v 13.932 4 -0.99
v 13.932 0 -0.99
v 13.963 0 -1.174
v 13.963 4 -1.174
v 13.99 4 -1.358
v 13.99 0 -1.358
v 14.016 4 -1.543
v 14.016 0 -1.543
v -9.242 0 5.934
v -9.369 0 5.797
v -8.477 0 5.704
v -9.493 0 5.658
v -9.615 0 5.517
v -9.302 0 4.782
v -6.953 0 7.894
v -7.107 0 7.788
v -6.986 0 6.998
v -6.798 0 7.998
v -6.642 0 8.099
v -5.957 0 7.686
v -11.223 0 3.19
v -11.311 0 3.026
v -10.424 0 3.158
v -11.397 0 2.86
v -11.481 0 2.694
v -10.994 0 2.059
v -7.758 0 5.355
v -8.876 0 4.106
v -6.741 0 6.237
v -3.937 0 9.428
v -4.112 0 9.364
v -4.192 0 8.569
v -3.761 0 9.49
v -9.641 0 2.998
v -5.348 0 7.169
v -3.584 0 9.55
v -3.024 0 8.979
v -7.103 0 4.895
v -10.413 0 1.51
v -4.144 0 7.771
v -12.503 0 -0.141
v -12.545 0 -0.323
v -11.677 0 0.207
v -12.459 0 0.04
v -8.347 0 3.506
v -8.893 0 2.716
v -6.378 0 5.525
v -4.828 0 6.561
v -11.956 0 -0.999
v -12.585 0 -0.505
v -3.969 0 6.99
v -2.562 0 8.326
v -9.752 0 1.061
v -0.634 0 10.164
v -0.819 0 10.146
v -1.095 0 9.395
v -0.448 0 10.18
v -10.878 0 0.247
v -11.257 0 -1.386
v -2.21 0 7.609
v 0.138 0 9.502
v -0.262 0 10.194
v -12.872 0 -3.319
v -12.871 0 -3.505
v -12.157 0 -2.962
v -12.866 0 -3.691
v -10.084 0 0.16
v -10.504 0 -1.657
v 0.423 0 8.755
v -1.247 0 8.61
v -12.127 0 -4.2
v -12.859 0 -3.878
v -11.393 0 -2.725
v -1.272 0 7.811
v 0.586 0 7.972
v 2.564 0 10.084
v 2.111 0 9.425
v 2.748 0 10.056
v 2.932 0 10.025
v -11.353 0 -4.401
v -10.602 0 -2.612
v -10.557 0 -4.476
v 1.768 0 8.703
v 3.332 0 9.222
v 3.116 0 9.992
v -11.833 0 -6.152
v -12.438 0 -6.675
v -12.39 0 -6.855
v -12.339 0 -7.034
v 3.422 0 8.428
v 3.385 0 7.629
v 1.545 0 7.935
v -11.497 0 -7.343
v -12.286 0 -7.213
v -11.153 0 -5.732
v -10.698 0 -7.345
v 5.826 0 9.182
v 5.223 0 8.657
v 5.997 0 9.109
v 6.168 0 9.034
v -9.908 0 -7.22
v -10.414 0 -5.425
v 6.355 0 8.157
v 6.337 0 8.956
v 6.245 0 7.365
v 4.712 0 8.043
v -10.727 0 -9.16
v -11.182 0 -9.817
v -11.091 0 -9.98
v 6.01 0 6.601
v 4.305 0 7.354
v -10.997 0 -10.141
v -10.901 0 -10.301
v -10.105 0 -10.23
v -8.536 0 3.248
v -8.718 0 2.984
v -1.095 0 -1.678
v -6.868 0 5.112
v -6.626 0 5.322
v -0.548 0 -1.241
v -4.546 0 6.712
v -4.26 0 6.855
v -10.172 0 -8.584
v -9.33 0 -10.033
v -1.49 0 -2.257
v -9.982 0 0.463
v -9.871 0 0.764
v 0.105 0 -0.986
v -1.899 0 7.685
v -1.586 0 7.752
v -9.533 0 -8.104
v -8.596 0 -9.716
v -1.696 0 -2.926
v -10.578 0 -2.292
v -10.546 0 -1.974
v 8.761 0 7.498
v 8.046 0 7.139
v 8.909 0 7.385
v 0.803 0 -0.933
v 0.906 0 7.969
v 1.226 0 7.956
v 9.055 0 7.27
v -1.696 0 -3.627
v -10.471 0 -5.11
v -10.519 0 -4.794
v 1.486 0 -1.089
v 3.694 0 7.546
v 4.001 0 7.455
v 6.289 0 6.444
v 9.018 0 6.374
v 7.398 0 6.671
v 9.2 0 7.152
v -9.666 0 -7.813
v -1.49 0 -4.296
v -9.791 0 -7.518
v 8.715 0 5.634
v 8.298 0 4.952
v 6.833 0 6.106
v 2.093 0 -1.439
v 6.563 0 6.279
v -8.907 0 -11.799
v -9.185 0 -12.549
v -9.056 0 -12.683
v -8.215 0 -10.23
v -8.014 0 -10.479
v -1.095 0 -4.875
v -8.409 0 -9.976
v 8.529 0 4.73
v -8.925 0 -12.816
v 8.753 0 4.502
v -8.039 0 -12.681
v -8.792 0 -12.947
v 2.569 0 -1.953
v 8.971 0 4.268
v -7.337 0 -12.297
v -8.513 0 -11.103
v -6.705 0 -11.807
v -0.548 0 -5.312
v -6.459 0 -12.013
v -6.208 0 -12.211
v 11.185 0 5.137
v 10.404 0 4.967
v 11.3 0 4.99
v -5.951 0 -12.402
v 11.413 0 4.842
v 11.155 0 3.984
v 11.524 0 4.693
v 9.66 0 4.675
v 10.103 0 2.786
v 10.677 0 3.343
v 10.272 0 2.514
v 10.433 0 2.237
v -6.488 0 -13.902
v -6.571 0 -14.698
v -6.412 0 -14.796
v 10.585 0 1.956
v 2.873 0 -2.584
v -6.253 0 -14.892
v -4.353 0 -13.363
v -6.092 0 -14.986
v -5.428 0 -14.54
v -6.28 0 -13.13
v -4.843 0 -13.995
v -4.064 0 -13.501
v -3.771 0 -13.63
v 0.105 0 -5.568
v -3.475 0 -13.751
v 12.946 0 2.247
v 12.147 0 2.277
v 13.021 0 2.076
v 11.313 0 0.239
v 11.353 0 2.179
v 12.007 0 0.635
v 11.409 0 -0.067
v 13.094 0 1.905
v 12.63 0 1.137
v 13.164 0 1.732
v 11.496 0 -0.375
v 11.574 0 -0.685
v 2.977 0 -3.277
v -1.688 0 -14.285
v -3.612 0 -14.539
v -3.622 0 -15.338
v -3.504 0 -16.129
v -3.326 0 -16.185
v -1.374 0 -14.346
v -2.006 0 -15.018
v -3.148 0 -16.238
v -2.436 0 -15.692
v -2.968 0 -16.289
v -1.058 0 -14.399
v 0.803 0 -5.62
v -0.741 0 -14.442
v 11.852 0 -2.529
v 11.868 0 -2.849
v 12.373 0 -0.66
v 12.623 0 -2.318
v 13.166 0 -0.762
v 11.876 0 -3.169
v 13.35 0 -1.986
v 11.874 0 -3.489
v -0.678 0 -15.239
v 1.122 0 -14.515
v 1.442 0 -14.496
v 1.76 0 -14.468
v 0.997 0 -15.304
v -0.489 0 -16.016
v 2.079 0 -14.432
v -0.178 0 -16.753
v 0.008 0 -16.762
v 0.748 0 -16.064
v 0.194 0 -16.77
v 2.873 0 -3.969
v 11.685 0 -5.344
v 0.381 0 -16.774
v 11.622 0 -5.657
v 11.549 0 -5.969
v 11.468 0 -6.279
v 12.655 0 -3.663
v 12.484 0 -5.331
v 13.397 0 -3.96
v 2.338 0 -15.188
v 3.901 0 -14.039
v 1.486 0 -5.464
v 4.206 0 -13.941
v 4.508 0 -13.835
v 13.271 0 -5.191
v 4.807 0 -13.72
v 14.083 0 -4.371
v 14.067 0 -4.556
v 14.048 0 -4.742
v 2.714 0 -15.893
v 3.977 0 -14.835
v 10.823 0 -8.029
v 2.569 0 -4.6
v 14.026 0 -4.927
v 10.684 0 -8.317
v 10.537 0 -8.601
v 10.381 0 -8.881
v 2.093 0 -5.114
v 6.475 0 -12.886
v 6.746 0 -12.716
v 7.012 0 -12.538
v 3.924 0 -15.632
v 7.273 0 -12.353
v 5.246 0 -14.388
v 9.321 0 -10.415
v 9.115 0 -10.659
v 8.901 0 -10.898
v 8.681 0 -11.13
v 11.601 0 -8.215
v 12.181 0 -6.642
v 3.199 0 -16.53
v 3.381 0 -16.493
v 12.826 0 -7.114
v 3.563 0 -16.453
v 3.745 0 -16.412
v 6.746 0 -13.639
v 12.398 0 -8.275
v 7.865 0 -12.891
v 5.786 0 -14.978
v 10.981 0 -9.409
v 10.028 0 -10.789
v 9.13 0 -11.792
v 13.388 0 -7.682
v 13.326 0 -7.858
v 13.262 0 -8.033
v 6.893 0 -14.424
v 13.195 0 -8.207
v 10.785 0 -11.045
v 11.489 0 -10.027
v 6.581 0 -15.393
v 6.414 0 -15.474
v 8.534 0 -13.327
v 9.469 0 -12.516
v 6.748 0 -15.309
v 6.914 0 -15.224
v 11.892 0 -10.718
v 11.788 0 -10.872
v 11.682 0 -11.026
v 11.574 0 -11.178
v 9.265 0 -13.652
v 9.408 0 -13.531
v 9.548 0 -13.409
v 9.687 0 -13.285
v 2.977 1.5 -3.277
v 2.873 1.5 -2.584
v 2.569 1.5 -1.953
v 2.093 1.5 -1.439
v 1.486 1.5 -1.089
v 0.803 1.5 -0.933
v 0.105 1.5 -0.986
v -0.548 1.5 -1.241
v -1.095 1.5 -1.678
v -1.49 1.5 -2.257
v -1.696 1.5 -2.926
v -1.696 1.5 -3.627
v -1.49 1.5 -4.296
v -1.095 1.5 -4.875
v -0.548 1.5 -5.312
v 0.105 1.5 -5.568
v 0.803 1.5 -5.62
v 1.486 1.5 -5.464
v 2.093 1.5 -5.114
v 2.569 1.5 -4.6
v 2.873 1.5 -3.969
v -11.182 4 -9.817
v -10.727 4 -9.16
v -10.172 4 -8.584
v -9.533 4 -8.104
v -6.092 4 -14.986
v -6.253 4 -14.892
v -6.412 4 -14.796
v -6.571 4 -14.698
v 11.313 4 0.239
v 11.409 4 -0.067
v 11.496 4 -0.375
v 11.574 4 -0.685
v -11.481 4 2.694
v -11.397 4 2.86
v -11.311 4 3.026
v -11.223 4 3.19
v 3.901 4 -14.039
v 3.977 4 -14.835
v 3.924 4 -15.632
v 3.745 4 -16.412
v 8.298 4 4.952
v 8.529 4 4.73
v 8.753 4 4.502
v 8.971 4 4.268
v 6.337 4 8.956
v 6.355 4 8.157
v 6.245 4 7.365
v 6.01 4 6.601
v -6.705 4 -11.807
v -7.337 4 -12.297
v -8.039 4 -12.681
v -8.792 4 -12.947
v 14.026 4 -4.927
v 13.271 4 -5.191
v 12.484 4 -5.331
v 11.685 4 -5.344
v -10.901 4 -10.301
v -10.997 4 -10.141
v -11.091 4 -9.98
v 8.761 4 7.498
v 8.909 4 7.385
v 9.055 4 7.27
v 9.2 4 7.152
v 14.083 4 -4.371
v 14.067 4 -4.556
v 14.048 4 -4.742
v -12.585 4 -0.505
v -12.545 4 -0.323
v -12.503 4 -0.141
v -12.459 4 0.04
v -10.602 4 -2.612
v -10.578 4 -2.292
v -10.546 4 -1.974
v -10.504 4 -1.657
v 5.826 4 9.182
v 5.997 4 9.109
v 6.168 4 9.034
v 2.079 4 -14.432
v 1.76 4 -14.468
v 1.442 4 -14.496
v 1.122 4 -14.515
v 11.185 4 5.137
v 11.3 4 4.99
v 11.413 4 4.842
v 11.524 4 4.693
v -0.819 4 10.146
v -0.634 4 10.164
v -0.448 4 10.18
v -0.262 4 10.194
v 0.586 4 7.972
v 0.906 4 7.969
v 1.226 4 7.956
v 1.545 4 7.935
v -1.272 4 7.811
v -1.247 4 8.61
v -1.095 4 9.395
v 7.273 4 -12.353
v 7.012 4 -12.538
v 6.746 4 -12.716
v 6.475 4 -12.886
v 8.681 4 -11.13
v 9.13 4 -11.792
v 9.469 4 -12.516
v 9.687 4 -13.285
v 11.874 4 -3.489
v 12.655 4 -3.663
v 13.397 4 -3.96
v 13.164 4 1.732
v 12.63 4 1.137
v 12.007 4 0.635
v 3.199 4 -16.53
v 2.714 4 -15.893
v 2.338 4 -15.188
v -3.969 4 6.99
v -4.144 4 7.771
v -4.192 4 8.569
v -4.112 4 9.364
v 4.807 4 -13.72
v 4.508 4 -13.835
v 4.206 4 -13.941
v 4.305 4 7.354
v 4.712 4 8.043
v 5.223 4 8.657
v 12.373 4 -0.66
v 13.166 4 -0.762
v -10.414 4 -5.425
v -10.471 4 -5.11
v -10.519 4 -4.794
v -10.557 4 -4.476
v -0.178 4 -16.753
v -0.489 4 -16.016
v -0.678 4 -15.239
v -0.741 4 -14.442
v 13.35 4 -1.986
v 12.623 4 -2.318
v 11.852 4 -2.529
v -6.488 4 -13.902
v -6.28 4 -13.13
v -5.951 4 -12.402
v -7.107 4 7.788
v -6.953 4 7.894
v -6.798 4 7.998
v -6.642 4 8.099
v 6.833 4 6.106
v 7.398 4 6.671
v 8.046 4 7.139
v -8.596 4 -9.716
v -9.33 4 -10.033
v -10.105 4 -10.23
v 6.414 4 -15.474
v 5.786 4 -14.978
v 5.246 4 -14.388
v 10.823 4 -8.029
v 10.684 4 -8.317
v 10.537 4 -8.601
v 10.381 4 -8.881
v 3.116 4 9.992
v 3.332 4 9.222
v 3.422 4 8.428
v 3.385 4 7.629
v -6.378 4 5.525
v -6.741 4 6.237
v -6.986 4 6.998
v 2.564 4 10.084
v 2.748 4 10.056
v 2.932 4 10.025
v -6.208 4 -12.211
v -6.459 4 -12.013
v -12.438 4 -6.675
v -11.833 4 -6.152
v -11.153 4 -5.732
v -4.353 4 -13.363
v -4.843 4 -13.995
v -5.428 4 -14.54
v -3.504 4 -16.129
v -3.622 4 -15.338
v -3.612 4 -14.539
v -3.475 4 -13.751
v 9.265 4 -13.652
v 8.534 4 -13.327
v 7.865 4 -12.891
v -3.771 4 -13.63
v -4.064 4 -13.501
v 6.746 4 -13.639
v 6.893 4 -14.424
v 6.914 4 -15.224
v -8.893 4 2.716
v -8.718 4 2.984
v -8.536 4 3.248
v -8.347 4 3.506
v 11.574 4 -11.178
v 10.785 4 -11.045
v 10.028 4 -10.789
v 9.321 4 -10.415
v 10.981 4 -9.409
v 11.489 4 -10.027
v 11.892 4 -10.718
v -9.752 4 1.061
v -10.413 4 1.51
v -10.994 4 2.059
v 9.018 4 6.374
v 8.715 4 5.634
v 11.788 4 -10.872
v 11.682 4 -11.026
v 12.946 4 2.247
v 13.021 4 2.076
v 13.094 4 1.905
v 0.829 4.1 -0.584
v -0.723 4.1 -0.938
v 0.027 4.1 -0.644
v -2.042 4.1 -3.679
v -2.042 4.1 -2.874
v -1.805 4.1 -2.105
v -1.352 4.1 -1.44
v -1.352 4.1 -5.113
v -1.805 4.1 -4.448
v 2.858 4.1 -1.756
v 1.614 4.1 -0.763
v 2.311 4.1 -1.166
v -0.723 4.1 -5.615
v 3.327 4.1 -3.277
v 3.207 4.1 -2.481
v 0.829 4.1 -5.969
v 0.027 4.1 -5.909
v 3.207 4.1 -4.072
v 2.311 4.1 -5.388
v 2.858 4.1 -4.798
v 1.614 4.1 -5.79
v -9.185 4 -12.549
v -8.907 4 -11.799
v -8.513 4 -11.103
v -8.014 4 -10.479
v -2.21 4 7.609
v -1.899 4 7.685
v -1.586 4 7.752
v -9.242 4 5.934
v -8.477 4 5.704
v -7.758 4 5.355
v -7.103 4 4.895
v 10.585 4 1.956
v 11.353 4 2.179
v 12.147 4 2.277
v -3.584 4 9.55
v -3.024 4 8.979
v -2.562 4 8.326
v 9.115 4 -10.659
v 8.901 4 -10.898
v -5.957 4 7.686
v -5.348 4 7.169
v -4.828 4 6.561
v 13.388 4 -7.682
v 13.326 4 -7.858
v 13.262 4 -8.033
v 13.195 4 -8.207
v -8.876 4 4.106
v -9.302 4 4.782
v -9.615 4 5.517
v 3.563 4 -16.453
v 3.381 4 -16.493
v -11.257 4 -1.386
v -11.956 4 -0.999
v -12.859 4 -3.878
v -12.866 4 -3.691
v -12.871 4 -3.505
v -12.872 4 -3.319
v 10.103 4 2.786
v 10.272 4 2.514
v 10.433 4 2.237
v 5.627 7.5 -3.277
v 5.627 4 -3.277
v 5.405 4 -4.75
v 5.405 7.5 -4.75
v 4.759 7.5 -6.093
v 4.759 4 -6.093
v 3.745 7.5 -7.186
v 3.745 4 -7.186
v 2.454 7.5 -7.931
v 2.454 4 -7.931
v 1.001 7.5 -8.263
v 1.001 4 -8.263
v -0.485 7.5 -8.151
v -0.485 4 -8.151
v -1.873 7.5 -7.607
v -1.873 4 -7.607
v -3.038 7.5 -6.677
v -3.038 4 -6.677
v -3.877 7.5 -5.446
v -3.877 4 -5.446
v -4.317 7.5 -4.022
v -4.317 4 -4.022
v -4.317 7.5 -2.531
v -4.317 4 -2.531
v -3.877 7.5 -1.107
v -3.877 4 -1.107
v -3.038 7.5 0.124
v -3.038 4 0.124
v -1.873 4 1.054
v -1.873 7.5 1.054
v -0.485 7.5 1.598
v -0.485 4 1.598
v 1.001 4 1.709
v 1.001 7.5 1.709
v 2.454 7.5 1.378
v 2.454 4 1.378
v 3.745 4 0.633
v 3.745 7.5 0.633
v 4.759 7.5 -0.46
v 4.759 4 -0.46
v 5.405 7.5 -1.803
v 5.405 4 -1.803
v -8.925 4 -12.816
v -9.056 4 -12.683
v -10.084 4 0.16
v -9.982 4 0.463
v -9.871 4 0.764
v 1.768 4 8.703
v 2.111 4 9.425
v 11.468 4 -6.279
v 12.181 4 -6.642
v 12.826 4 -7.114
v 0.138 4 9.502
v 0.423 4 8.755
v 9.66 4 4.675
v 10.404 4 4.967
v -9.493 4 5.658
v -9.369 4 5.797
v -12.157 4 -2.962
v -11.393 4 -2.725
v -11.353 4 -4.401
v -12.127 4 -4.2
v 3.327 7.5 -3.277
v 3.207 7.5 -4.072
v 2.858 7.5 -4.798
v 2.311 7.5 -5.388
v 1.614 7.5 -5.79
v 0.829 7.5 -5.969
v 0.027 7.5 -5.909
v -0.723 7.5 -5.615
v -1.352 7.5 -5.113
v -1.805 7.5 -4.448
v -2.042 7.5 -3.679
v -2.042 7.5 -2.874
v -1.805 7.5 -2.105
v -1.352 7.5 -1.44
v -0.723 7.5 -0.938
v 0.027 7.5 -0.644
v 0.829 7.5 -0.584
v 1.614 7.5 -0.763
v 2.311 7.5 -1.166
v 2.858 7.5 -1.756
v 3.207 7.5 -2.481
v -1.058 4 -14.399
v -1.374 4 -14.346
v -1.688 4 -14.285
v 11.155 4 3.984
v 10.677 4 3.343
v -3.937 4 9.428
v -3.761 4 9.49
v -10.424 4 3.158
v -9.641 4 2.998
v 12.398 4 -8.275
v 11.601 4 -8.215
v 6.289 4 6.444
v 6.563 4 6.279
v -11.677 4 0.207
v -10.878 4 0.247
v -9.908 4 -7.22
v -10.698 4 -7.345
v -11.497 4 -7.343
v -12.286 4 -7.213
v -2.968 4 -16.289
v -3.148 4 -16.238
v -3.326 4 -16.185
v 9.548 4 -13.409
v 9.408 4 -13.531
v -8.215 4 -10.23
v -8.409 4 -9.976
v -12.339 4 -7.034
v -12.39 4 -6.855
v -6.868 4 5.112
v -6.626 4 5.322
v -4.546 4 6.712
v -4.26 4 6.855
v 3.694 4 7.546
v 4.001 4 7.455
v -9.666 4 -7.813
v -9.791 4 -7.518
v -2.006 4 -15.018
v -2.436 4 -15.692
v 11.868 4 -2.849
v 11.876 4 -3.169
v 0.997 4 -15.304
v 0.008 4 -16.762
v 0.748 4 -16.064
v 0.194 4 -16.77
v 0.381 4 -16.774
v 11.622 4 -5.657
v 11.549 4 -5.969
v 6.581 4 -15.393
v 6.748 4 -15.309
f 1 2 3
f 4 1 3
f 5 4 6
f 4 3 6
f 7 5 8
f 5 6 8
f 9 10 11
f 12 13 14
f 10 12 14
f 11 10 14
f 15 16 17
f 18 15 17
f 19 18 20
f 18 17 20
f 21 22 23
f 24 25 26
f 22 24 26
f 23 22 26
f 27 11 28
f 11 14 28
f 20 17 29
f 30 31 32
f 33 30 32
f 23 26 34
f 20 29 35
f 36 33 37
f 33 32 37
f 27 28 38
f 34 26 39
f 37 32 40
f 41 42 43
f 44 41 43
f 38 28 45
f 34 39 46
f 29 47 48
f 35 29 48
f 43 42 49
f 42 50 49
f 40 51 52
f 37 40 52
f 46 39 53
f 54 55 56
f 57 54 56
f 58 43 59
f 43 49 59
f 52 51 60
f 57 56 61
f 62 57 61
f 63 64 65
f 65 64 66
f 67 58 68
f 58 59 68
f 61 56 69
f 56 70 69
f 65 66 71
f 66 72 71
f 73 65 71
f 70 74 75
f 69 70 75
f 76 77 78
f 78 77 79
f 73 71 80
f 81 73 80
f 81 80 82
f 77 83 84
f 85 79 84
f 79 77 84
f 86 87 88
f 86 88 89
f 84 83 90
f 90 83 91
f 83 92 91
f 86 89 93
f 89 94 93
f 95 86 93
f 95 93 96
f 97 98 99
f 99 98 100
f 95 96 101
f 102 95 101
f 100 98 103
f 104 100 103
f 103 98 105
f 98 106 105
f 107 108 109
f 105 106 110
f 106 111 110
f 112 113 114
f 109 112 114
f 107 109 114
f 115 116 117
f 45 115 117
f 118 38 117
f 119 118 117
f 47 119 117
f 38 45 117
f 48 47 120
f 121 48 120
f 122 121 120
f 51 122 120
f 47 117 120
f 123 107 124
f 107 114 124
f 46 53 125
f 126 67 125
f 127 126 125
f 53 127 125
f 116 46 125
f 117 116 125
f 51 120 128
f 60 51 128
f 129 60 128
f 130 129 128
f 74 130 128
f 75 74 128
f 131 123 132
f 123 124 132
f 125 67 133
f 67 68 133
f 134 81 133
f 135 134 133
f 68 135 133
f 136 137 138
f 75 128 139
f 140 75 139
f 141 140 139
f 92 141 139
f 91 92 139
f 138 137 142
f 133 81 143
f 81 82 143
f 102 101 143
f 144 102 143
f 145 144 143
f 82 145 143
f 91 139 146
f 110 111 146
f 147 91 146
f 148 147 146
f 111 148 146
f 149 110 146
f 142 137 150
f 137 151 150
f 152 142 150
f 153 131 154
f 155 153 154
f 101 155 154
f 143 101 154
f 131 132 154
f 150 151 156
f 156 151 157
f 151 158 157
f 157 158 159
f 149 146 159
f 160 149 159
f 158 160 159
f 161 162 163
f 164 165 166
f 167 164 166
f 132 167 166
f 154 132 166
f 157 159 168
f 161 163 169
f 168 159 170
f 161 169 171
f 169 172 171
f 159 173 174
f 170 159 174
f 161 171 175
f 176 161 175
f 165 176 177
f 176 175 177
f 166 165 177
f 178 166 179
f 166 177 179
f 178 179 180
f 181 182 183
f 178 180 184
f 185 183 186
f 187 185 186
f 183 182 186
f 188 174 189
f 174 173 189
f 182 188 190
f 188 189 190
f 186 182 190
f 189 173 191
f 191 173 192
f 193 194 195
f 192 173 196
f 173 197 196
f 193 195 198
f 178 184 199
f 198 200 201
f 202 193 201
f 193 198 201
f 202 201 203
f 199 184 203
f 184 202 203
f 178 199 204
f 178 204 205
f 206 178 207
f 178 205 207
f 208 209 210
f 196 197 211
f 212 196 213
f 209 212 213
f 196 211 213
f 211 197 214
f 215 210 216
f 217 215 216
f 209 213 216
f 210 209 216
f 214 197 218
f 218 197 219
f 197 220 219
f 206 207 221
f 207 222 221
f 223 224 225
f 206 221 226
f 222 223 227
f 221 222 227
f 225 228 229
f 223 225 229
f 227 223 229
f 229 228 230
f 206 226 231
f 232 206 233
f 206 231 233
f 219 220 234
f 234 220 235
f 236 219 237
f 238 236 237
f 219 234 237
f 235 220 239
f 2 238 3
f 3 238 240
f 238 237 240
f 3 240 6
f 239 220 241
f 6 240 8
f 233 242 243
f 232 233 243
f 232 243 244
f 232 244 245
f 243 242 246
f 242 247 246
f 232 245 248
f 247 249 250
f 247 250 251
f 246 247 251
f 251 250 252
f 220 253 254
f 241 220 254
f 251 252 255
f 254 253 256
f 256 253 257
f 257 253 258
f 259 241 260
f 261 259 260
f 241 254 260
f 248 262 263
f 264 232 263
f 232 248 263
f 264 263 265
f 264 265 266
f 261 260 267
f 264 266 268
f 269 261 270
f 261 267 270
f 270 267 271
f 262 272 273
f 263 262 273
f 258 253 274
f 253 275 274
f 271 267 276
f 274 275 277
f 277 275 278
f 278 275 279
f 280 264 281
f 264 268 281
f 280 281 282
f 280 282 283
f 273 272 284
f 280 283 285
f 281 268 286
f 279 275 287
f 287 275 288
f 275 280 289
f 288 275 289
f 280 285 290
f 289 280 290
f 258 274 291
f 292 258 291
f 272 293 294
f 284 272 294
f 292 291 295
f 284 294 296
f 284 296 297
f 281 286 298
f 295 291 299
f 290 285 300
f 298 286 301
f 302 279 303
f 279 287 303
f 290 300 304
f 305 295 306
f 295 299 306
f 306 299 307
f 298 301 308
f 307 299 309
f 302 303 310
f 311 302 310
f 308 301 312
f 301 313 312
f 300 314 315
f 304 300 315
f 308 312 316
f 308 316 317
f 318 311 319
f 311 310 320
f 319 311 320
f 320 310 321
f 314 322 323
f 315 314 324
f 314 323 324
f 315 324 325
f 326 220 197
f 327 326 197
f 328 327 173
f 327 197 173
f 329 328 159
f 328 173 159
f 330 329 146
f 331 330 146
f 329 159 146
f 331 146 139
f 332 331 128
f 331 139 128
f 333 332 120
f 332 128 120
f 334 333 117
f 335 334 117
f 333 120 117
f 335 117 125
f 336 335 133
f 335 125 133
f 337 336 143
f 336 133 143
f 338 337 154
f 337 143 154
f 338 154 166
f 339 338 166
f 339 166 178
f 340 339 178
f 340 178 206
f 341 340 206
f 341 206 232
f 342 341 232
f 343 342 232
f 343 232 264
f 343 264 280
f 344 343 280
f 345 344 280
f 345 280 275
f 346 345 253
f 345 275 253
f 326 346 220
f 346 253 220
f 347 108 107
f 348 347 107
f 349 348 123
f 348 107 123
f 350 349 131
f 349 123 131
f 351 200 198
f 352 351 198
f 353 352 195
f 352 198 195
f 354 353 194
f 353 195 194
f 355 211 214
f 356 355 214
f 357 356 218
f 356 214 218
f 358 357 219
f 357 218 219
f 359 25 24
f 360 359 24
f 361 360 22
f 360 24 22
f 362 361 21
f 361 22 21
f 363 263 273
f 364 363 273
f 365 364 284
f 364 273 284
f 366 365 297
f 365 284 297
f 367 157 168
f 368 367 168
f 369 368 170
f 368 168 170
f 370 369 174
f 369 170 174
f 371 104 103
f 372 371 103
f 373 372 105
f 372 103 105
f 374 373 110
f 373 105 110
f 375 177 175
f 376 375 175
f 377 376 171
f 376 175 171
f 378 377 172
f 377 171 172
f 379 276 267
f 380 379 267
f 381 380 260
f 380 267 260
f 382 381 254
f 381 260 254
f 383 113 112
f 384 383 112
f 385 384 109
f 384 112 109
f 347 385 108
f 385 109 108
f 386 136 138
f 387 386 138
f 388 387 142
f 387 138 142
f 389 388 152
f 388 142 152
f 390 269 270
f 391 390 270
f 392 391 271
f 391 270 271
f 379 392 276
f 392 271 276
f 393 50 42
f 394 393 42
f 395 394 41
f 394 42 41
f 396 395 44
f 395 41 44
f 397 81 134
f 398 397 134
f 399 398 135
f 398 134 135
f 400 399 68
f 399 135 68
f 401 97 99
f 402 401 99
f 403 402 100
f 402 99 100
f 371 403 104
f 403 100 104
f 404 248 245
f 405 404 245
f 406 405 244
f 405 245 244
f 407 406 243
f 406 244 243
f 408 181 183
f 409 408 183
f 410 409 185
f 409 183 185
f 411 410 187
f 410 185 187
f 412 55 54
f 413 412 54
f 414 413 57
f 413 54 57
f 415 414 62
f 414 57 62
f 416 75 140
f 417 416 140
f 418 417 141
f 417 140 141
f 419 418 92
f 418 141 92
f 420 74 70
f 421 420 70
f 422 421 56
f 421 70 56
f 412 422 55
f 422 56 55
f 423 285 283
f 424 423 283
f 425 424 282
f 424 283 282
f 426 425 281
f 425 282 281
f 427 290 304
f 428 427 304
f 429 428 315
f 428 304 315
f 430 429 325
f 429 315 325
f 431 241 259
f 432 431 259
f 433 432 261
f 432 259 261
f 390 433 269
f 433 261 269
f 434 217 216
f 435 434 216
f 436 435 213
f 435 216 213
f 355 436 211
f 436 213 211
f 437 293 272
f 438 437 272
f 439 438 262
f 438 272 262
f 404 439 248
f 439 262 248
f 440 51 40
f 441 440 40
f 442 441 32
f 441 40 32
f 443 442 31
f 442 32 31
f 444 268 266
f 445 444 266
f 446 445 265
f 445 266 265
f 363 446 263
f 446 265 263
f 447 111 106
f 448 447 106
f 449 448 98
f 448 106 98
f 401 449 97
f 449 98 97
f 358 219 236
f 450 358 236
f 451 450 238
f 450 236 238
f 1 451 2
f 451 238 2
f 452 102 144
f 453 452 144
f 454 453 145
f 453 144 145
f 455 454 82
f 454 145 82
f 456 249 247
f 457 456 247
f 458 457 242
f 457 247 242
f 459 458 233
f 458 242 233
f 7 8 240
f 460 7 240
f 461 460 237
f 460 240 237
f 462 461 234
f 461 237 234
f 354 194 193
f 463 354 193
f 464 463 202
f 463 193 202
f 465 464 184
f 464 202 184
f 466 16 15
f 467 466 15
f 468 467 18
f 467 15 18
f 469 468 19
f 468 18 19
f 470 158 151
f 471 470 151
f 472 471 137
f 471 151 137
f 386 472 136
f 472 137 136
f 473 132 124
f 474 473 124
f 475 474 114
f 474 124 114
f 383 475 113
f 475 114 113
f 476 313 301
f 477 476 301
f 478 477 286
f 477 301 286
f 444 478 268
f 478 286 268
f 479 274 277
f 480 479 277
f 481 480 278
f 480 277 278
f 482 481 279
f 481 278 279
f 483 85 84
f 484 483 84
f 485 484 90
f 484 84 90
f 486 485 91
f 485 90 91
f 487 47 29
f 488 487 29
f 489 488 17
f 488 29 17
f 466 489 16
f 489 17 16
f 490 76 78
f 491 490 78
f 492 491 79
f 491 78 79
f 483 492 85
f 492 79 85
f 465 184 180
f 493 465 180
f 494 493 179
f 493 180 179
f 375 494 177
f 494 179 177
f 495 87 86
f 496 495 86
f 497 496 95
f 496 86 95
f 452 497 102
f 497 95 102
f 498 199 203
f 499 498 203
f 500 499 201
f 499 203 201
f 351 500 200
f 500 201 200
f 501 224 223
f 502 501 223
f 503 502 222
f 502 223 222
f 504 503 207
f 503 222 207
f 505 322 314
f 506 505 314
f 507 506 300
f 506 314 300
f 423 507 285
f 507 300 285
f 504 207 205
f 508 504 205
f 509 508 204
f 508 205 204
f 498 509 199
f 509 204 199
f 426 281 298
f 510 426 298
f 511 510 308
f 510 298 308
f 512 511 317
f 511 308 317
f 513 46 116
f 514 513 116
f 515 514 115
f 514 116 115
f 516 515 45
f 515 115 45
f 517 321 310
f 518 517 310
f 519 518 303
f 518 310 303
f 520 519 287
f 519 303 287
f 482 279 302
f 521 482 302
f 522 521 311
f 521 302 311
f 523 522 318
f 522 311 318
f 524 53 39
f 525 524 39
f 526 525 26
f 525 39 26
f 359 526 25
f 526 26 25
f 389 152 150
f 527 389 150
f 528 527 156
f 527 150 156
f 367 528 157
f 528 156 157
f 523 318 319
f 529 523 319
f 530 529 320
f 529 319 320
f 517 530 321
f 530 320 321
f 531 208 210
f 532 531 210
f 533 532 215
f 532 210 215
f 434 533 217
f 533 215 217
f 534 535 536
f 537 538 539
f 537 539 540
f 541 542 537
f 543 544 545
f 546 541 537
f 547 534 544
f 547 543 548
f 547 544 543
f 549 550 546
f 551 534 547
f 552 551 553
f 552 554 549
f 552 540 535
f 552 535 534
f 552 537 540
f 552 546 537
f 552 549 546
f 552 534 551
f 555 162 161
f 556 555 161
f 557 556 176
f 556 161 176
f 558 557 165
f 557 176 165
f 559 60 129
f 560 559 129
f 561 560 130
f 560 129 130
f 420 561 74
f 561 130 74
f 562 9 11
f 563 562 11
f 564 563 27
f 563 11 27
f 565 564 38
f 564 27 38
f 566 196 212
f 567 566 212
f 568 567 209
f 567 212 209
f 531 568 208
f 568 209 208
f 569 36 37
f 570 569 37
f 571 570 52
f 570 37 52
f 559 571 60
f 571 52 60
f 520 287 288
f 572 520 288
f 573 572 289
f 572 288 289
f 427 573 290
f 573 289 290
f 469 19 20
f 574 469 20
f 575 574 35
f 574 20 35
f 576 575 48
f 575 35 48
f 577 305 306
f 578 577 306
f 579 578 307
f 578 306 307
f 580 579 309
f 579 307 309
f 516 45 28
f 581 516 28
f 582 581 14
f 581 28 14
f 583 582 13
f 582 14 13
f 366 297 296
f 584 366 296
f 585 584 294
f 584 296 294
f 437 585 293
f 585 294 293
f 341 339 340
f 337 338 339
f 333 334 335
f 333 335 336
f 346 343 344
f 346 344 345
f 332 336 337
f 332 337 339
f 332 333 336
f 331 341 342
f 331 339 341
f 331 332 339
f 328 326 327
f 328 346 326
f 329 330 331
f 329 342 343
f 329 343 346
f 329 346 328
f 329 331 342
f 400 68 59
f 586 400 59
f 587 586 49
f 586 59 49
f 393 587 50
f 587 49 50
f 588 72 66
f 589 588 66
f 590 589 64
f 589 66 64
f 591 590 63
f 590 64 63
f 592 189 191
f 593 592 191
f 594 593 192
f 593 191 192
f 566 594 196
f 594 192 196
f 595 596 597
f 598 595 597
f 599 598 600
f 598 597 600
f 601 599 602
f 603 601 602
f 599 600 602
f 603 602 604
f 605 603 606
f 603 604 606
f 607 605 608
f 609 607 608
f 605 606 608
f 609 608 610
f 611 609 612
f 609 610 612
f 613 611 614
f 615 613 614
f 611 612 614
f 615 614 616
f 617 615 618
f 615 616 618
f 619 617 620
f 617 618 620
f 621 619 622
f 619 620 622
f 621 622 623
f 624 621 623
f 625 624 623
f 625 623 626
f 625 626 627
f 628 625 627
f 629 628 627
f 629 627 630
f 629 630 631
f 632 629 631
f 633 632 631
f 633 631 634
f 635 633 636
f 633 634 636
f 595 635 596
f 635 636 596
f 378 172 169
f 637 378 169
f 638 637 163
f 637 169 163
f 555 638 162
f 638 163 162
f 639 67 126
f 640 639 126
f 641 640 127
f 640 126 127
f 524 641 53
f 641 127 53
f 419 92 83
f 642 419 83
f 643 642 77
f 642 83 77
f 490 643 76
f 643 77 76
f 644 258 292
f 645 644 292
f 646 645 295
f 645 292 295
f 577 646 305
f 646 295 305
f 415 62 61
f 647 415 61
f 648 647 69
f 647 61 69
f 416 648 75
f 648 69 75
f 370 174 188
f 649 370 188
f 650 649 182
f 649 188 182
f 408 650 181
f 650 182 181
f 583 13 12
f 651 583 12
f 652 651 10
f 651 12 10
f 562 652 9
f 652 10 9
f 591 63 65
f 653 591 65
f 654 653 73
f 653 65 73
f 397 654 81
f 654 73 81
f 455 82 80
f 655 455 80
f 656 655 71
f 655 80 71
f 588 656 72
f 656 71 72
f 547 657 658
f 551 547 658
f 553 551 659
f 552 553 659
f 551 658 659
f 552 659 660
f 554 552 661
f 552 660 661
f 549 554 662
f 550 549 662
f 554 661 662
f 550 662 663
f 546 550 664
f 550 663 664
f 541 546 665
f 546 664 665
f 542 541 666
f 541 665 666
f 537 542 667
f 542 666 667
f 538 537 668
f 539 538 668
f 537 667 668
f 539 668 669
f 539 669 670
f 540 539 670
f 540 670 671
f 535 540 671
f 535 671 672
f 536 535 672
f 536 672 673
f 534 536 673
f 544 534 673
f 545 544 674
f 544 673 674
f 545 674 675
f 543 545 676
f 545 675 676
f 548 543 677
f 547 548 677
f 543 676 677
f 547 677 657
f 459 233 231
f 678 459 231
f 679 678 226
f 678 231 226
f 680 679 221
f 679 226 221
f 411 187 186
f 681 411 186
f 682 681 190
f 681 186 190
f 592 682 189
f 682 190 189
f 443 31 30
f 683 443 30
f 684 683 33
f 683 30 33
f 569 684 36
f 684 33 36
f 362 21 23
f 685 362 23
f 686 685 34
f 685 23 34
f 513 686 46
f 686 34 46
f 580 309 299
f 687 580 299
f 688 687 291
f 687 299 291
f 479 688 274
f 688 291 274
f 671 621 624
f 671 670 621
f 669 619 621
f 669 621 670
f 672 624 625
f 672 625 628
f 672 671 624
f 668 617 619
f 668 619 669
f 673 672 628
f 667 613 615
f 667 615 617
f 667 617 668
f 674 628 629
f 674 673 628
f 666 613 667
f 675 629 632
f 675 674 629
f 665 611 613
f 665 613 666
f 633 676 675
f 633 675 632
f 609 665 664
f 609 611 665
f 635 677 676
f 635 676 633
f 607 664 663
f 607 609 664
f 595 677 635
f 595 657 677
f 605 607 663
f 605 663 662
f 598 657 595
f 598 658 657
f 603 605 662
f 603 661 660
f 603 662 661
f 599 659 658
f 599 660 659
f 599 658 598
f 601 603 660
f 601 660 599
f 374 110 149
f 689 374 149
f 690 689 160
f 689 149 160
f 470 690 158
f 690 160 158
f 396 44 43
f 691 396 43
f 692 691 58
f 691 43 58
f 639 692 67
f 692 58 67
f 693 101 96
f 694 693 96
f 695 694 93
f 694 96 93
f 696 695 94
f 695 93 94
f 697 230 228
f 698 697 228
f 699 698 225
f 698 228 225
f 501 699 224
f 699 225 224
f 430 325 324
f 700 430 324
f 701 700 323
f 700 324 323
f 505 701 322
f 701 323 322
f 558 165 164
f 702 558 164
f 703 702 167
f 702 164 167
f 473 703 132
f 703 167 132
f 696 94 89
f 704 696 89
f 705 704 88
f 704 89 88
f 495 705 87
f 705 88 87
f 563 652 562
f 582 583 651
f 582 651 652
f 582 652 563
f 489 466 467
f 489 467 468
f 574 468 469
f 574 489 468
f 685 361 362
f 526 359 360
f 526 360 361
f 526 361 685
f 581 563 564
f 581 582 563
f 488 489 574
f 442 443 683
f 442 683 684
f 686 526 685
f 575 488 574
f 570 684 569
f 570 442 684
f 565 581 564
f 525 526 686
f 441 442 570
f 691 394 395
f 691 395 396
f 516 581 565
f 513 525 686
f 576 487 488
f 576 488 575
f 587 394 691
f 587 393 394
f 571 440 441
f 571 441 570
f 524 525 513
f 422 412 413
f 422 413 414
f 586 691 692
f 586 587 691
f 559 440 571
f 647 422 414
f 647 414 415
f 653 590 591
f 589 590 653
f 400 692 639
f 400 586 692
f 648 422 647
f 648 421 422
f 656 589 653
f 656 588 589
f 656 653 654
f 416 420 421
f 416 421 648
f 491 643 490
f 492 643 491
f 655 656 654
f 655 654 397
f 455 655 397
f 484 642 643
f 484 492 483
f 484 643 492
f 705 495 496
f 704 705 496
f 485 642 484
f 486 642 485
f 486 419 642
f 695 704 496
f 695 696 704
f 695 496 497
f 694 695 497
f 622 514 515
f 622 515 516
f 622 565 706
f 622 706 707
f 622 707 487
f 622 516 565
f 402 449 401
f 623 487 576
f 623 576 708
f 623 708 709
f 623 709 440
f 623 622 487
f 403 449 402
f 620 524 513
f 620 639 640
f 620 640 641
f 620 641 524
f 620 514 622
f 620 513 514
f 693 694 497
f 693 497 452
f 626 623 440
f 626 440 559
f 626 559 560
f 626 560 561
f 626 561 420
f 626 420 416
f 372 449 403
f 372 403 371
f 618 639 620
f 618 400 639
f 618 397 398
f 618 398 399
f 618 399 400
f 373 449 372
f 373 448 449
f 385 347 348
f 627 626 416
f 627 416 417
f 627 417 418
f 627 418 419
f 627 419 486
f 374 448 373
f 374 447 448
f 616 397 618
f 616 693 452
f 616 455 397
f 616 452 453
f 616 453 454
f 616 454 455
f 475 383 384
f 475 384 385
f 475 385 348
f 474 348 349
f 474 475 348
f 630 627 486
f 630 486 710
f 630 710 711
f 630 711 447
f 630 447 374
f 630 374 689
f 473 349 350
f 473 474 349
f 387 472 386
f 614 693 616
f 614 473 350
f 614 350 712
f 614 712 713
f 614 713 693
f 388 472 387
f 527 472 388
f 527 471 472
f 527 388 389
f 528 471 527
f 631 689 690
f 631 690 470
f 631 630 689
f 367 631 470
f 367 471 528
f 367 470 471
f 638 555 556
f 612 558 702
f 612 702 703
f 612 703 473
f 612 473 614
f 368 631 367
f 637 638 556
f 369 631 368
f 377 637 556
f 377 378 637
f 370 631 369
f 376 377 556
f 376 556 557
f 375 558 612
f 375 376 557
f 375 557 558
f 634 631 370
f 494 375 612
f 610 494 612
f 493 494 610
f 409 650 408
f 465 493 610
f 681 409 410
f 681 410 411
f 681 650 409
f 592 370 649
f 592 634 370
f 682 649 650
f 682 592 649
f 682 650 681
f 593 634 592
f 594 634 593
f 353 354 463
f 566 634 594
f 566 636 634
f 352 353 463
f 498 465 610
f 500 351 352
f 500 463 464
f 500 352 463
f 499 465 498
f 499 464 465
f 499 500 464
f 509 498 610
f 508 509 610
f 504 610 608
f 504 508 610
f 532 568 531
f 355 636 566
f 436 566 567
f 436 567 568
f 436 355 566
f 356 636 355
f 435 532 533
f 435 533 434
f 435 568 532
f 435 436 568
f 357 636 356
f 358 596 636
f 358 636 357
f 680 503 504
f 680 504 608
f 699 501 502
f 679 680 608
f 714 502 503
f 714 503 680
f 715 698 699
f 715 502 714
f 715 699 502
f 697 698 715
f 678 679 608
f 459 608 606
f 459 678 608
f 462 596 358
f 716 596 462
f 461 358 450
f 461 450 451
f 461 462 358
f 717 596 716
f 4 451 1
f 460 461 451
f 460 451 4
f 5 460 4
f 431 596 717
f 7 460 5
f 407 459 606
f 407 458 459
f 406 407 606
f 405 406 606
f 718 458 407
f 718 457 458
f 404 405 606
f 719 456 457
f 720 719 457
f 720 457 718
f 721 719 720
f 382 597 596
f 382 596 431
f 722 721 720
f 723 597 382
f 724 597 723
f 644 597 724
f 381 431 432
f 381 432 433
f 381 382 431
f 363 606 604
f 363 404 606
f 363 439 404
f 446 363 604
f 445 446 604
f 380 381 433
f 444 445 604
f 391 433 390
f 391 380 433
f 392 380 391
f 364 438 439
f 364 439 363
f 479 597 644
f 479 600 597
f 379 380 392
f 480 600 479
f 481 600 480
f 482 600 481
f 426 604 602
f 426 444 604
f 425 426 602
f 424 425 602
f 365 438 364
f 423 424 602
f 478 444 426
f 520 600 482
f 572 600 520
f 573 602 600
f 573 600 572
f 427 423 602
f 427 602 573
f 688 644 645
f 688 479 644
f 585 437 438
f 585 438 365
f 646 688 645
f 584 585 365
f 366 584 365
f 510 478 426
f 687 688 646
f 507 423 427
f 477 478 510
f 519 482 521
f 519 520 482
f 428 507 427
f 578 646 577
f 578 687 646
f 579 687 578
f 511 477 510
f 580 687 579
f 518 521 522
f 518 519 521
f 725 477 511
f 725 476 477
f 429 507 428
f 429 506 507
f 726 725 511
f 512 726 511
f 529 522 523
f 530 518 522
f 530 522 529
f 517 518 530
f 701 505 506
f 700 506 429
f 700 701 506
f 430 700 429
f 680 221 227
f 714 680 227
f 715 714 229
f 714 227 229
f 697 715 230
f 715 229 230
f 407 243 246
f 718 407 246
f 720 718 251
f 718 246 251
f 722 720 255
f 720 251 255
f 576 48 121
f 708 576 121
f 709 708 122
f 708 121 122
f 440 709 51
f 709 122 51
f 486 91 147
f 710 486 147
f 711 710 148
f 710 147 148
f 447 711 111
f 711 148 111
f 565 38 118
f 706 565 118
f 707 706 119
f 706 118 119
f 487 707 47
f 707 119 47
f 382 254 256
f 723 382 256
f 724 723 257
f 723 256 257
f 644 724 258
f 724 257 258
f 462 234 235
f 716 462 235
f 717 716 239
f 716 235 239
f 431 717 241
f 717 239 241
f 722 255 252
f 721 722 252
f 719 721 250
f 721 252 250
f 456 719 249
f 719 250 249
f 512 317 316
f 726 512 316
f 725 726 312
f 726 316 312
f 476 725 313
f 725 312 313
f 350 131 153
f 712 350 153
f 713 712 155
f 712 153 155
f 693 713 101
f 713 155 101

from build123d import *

# Parameters (mm, degrees)
BOSS_EXTRUDE1_DEPTH = 4
SKETCH2_R           = 5
BOSS_EXTRUDE2_DEPTH = 3.5
SKETCH3_R           = 2.7
CUT_EXTRUDE1_DEPTH  = 3.4
SKETCH4_R           = 2.35
CUT_EXTRUDE2_DEPTH  = 1.5


with BuildPart() as part:
    # Sketch1 → Boss-Extrude1 (new body)
    with BuildSketch(Plane(origin=(0, 0, 0), x_dir=(1, 0, 0), z_dir=(0, 1, 0))):
        with BuildLine():
            ThreePointArc((3.901208796, 14.038686533), (3.966253303, 15.234612101), (3.74502345, 16.41169583))
            ThreePointArc((3.74502345, 16.41169583), (3.4723799, 16.473432267), (3.198516489, 16.529510113))
            ThreePointArc((3.198516489, 16.529510113), (2.511969944, 15.548122017), (2.078508173, 14.431618705))
            ThreePointArc((2.078508173, 14.431618705), (1.601109064, 14.483383768), (1.121935684, 14.514727092))
            ThreePointArc((1.121935684, 14.514727092), (0.887522104, 15.689256371), (0.380513774, 16.774342223))
            ThreePointArc((0.380513774, 16.774342223), (0.101082595, 16.766335403), (-0.178122887, 16.752544399))
            ThreePointArc((-0.178122887, 16.752544399), (-0.599039015, 15.631251232), (-0.741219705, 14.442027366))
            ThreePointArc((-0.741219705, 14.442027366), (-1.216493891, 14.373441804), (-1.688407925, 14.284634846))
            ThreePointArc((-1.688407925, 14.284634846), (-2.207550525, 15.363967841), (-2.968480134, 16.288875881))
            ThreePointArc((-2.968480134, 16.288875881), (-3.237141254, 16.211628901), (-3.504145299, 16.128835588))
            ThreePointArc((-3.504145299, 16.128835588), (-3.632983302, 14.938092323), (-3.474949175, 13.750871212))
            ThreePointArc((-3.474949175, 13.750871212), (-3.918235212, 13.566244507), (-4.353237807, 13.362867335))
            ThreePointArc((-4.353237807, 13.362867335), (-5.124489789, 14.279185585), (-6.091528671, 14.985800439))
            ThreePointArc((-6.091528671, 14.985800439), (-6.332538765, 14.844167012), (-6.570564527, 14.697573597))
            ThreePointArc((-6.570564527, 14.697573597), (-6.399229039, 13.512199013), (-5.95090996, 12.401578126))
            ThreePointArc((-5.95090996, 12.401578126), (-6.334354558, 12.112511054), (-6.7051129, 11.807342604))
            ThreePointArc((-6.7051129, 11.807342604), (-7.680013665, 12.503070462), (-8.792399211, 12.946992921))
            ThreePointArc((-8.792399211, 12.946992921), (-8.990614728, 12.749872395), (-9.184706174, 12.548689882))
            ThreePointArc((-9.184706174, 12.548689882), (-8.723962833, 11.443165424), (-8.013528339, 10.478929154))
            ThreePointArc((-8.013528339, 10.478929154), (-8.313038262, 10.103584863), (-8.596256242, 9.71579999))
            ThreePointArc((-8.596256242, 9.71579999), (-9.713549189, 10.147222317), (-10.901386124, 10.3005591))
            ThreePointArc((-10.901386124, 10.3005591), (-11.044352455, 10.060337283), (-11.182314104, 9.817206709))
            ThreePointArc((-11.182314104, 9.817206709), (-10.46111311, 8.860996544), (-9.533202414, 8.103731404))
            ThreePointArc((-9.533202414, 8.103731404), (-9.729958352, 7.665694155), (-9.907840342, 7.21965881))
            ThreePointArc((-9.907840342, 7.21965881), (-11.097321846, 7.359667754), (-12.285974007, 7.212784147))
            ThreePointArc((-12.285974007, 7.212784147), (-12.364708051, 6.944555059), (-12.437871267, 6.674753212))
            ThreePointArc((-12.437871267, 6.674753212), (-11.50152833, 5.927939542), (-10.414445472, 5.425227285))
            ThreePointArc((-10.414445472, 5.425227285), (-10.496084526, 4.952020569), (-10.557453547, 4.475760793))
            ThreePointArc((-10.557453547, 4.475760793), (-11.744384111, 4.315559077), (-12.85916411, 3.877684317))
            ThreePointArc((-12.85916411, 3.877684317), (-12.868718719, 3.598301779), (-12.872486386, 3.318781301))
            ThreePointArc((-12.872486386, 3.318781301), (-11.779835377, 2.828289175), (-10.601885772, 2.611717061))
            ThreePointArc((-10.601885772, 2.611717061), (-10.563278261, 2.133074197), (-10.504278271, 1.656515143))
            ThreePointArc((-10.504278271, 1.656515143), (-11.614078682, 1.206168831), (-12.584940793, 0.504816199))
            ThreePointArc((-12.584940793, 0.504816199), (-12.524715614, 0.231834843), (-12.458850997, -0.039840966))
            ThreePointArc((-12.458850997, -0.039840966), (-11.278547197, -0.243192124), (-10.08374575, -0.160016072))
            ThreePointArc((-10.08374575, -0.160016072), (-9.927317525, -0.614020193), (-9.751655711, -1.060934567))
            ThreePointArc((-9.751655711, -1.060934567), (-10.714593128, -1.773128561), (-11.480534513, -2.693890499))
            ThreePointArc((-11.480534513, -2.693890499), (-11.354313716, -2.943318251), (-11.222955331, -3.190079))
            ThreePointArc((-11.222955331, -3.190079), (-10.029161569, -3.093511889), (-8.89258205, -2.715813928))
            ThreePointArc((-8.89258205, -2.715813928), (-8.628162071, -3.116652557), (-8.34687591, -3.505840978))
            ThreePointArc((-8.34687591, -3.505840978), (-9.102445434, -4.435132885), (-9.61533918, -5.517449271))
            ThreePointArc((-9.61533918, -5.517449271), (-9.431053682, -5.727650955), (-9.242455259, -5.93399176))
            ThreePointArc((-9.242455259, -5.93399176), (-8.110181987, -5.543574046), (-7.103239867, -4.895086329))
            ThreePointArc((-7.103239867, -4.895086329), (-6.747442615, -5.217573301), (-6.378206351, -5.524581628))
            ThreePointArc((-6.378206351, -5.524581628), (-6.87893277, -6.61258062), (-7.106551876, -7.788445534))
            ThreePointArc((-7.106551876, -7.788445534), (-6.875781012, -7.946213407), (-6.641792884, -8.099169115))
            ThreePointArc((-6.641792884, -8.099169115), (-5.642184996, -7.43943218), (-4.828150152, -6.560901574))
            ThreePointArc((-4.828150152, -6.560901574), (-4.403331676, -6.784773846), (-3.969345782, -6.990311618))
            ThreePointArc((-3.969345782, -6.990311618), (-4.183766613, -8.168654718), (-4.111808933, -9.364184243))
            ThreePointArc((-4.111808933, -9.364184243), (-3.849052886, -9.459605167), (-3.584377387, -9.54956501))
            ThreePointArc((-3.584377387, -9.54956501), (-2.780243924, -8.661962551), (-2.210265158, -7.608590366))
            ThreePointArc((-2.210265158, -7.608590366), (-1.743118366, -7.71978122), (-1.271651772, -7.810933742))
            ThreePointArc((-1.271651772, -7.810933742), (-1.186294165, -9.005581318), (-0.819281066, -10.145655938))
            ThreePointArc((-0.819281066, -10.145655938), (-0.541049764, -10.172734267), (-0.26231743, -10.194045736))
            ThreePointArc((-0.26231743, -10.194045736), (0.295814947, -9.134349079), (0.585923772, -7.972322564))
            ThreePointArc((0.585923772, -7.972322564), (1.06604633, -7.96384547), (1.545369644, -7.934885294))
            ThreePointArc((1.545369644, -7.934885294), (1.925142356, -9.070773246), (2.564150092, -10.083757879))
            ThreePointArc((2.564150092, -10.083757879), (2.840374352, -10.040792181), (3.115649745, -9.992116198))
            ThreePointArc((3.115649745, -9.992116198), (3.392711524, -8.826909983), (3.384721804, -7.629243537))
            ThreePointArc((3.384721804, -7.629243537), (3.847652261, -7.501631141), (4.304714649, -7.354377941))
            ThreePointArc((4.304714649, -7.354377941), (4.95503995, -8.360134252), (5.825891117, -9.182379348))
            ThreePointArc((5.825891117, -9.182379348), (6.082752149, -9.072069317), (6.337274035, -8.956464373))
            ThreePointArc((6.337274035, -8.956464373), (6.315856407, -7.758962791), (6.010270165, -6.600910201))
            ThreePointArc((6.010270165, -6.600910201), (6.426920898, -6.362180861), (6.833003449, -6.105887097))
            ThreePointArc((6.833003449, -6.105887097), (7.713019008, -6.918316398), (8.760994824, -7.498157274))
            ThreePointArc((8.760994824, -7.498157274), (8.982353106, -7.327434094), (9.200128938, -7.152164073))
            ThreePointArc((9.200128938, -7.152164073), (8.881577651, -5.997610553), (8.297595995, -4.951936522))
            ThreePointArc((8.297595995, -4.951936522), (8.641787307, -4.617090479), (8.97137436, -4.267860032))
            ThreePointArc((8.97137436, -4.267860032), (10.025785563, -4.835914403), (11.185037854, -5.136917523))
            ThreePointArc((11.185037854, -5.136917523), (11.35698463, -4.91650836), (11.524330752, -4.692586122))
            ThreePointArc((11.524330752, -4.692586122), (10.928661555, -3.653525508), (10.1029782, -2.785933582))
            ThreePointArc((10.1029782, -2.785933582), (10.353083284, -2.376010444), (10.585465673, -1.955786746))
            ThreePointArc((10.585465673, -1.955786746), (11.748019987, -2.243773242), (12.945708667, -2.247025474))
            ThreePointArc((12.945708667, -2.247025474), (13.057439889, -1.990779446), (13.163841329, -1.732274849))
            ThreePointArc((13.163841329, -1.732274849), (12.328482308, -0.873995139), (11.312977976, -0.238999309))
            ThreePointArc((11.312977976, -0.238999309), (11.45328181, 0.220243944), (11.573858095, 0.685056692))
            ThreePointArc((11.573858095, 0.685056692), (12.771507956, 0.695233323), (13.932377842, 0.989936328))
            ThreePointArc((13.932377842, 0.989936328), (13.976873026, 1.265918341), (14.01564419, 1.542762503))
            ThreePointArc((14.01564419, 1.542762503), (12.993084025, 2.166332436), (11.851566587, 2.528833047))
            ThreePointArc((11.851566587, 2.528833047), (11.873253365, 3.008540473), (11.874447295, 3.488736377))
            ThreePointArc((11.874447295, 3.488736377), (13.031939958, 3.796436699), (14.083049324, 4.370577669))
            ThreePointArc((14.083049324, 4.370577669), (14.057512675, 4.648954702), (14.026217428, 4.926743291))
            ThreePointArc((14.026217428, 4.926743291), (12.880707334, 5.276422256), (11.68490253, 5.343650401))
            ThreePointArc((11.68490253, 5.343650401), (11.586609593, 5.813680219), (11.468346148, 6.279086803))
            ThreePointArc((11.468346148, 6.279086803), (12.512952092, 6.864976874), (13.388255872, 7.682480419))
            ThreePointArc((13.388255872, 7.682480419), (13.29429195, 7.945761019), (13.194896688, 8.207039558))
            ThreePointArc((13.194896688, 8.207039558), (11.998413278, 8.260855939), (10.823457921, 8.028587426))
            ThreePointArc((10.823457921, 8.028587426), (10.611361374, 8.459405933), (10.381071482, 8.880779992))
            ThreePointArc((10.381071482, 8.880779992), (11.247154274, 9.708046183), (11.891653912, 10.717545549))
            ThreePointArc((11.891653912, 10.717545549), (11.735166817, 10.949186827), (11.573916909, 11.177538224))
            ThreePointArc((11.573916909, 11.177538224), (10.401639636, 10.932110541), (9.321360492, 10.414939655))
            ThreePointArc((9.321360492, 10.414939655), (9.008787143, 10.77947694), (8.680940764, 11.13034199))
            ThreePointArc((8.680940764, 11.13034199), (9.314081237, 12.147004125), (9.68728045, 13.285068754))
            ThreePointArc((9.68728045, 13.285068754), (9.478102841, 13.470515838), (9.265130213, 13.651591934))
            ThreePointArc((9.265130213, 13.651591934), (8.190717569, 13.12234131), (7.27299255, 12.3527638))
            ThreePointArc((7.27299255, 12.3527638), (6.879582531, 12.628114645), (6.474779459, 12.886424546))
            ThreePointArc((6.474779459, 12.886424546), (6.835195068, 14.028602002), (6.913644378, 15.223723109))
            ThreePointArc((6.913644378, 15.223723109), (6.664919654, 15.351323676), (6.413606158, 15.473746794))
            ThreePointArc((6.413606158, 15.473746794), (5.504567441, 14.693927992), (4.807060586, 13.720299244))
            ThreePointArc((4.807060586, 13.720299244), (4.357533295, 13.889162343), (3.901208796, 14.038686533))
        make_face()
    extrude(amount=BOSS_EXTRUDE1_DEPTH)

    # Sketch2 → Boss-Extrude2 (add)
    with BuildSketch(Plane(origin=(0, 4, 0), x_dir=(1, 0, 0), z_dir=(0, 1, 0))):
        with Locations((0.627447718, 3.276600796)):
            Circle(SKETCH2_R)
    extrude(amount=BOSS_EXTRUDE2_DEPTH)

    # Sketch3 → Cut-Extrude1 (cut)
    with BuildSketch(Plane(origin=(0, 7.5, 0), x_dir=(1, 0, 0), z_dir=(0, 1, 0))):
        with Locations((0.627447718, 3.276600796)):
            Circle(SKETCH3_R)
    extrude(amount=-CUT_EXTRUDE1_DEPTH, mode=Mode.SUBTRACT)

    # Sketch4 → Cut-Extrude2 (cut)
    with BuildSketch(Plane.XZ):
        with Locations((0.627447718, -3.276600796)):
            Circle(SKETCH4_R)
    extrude(amount=-CUT_EXTRUDE2_DEPTH, mode=Mode.SUBTRACT)


solid = part.part
